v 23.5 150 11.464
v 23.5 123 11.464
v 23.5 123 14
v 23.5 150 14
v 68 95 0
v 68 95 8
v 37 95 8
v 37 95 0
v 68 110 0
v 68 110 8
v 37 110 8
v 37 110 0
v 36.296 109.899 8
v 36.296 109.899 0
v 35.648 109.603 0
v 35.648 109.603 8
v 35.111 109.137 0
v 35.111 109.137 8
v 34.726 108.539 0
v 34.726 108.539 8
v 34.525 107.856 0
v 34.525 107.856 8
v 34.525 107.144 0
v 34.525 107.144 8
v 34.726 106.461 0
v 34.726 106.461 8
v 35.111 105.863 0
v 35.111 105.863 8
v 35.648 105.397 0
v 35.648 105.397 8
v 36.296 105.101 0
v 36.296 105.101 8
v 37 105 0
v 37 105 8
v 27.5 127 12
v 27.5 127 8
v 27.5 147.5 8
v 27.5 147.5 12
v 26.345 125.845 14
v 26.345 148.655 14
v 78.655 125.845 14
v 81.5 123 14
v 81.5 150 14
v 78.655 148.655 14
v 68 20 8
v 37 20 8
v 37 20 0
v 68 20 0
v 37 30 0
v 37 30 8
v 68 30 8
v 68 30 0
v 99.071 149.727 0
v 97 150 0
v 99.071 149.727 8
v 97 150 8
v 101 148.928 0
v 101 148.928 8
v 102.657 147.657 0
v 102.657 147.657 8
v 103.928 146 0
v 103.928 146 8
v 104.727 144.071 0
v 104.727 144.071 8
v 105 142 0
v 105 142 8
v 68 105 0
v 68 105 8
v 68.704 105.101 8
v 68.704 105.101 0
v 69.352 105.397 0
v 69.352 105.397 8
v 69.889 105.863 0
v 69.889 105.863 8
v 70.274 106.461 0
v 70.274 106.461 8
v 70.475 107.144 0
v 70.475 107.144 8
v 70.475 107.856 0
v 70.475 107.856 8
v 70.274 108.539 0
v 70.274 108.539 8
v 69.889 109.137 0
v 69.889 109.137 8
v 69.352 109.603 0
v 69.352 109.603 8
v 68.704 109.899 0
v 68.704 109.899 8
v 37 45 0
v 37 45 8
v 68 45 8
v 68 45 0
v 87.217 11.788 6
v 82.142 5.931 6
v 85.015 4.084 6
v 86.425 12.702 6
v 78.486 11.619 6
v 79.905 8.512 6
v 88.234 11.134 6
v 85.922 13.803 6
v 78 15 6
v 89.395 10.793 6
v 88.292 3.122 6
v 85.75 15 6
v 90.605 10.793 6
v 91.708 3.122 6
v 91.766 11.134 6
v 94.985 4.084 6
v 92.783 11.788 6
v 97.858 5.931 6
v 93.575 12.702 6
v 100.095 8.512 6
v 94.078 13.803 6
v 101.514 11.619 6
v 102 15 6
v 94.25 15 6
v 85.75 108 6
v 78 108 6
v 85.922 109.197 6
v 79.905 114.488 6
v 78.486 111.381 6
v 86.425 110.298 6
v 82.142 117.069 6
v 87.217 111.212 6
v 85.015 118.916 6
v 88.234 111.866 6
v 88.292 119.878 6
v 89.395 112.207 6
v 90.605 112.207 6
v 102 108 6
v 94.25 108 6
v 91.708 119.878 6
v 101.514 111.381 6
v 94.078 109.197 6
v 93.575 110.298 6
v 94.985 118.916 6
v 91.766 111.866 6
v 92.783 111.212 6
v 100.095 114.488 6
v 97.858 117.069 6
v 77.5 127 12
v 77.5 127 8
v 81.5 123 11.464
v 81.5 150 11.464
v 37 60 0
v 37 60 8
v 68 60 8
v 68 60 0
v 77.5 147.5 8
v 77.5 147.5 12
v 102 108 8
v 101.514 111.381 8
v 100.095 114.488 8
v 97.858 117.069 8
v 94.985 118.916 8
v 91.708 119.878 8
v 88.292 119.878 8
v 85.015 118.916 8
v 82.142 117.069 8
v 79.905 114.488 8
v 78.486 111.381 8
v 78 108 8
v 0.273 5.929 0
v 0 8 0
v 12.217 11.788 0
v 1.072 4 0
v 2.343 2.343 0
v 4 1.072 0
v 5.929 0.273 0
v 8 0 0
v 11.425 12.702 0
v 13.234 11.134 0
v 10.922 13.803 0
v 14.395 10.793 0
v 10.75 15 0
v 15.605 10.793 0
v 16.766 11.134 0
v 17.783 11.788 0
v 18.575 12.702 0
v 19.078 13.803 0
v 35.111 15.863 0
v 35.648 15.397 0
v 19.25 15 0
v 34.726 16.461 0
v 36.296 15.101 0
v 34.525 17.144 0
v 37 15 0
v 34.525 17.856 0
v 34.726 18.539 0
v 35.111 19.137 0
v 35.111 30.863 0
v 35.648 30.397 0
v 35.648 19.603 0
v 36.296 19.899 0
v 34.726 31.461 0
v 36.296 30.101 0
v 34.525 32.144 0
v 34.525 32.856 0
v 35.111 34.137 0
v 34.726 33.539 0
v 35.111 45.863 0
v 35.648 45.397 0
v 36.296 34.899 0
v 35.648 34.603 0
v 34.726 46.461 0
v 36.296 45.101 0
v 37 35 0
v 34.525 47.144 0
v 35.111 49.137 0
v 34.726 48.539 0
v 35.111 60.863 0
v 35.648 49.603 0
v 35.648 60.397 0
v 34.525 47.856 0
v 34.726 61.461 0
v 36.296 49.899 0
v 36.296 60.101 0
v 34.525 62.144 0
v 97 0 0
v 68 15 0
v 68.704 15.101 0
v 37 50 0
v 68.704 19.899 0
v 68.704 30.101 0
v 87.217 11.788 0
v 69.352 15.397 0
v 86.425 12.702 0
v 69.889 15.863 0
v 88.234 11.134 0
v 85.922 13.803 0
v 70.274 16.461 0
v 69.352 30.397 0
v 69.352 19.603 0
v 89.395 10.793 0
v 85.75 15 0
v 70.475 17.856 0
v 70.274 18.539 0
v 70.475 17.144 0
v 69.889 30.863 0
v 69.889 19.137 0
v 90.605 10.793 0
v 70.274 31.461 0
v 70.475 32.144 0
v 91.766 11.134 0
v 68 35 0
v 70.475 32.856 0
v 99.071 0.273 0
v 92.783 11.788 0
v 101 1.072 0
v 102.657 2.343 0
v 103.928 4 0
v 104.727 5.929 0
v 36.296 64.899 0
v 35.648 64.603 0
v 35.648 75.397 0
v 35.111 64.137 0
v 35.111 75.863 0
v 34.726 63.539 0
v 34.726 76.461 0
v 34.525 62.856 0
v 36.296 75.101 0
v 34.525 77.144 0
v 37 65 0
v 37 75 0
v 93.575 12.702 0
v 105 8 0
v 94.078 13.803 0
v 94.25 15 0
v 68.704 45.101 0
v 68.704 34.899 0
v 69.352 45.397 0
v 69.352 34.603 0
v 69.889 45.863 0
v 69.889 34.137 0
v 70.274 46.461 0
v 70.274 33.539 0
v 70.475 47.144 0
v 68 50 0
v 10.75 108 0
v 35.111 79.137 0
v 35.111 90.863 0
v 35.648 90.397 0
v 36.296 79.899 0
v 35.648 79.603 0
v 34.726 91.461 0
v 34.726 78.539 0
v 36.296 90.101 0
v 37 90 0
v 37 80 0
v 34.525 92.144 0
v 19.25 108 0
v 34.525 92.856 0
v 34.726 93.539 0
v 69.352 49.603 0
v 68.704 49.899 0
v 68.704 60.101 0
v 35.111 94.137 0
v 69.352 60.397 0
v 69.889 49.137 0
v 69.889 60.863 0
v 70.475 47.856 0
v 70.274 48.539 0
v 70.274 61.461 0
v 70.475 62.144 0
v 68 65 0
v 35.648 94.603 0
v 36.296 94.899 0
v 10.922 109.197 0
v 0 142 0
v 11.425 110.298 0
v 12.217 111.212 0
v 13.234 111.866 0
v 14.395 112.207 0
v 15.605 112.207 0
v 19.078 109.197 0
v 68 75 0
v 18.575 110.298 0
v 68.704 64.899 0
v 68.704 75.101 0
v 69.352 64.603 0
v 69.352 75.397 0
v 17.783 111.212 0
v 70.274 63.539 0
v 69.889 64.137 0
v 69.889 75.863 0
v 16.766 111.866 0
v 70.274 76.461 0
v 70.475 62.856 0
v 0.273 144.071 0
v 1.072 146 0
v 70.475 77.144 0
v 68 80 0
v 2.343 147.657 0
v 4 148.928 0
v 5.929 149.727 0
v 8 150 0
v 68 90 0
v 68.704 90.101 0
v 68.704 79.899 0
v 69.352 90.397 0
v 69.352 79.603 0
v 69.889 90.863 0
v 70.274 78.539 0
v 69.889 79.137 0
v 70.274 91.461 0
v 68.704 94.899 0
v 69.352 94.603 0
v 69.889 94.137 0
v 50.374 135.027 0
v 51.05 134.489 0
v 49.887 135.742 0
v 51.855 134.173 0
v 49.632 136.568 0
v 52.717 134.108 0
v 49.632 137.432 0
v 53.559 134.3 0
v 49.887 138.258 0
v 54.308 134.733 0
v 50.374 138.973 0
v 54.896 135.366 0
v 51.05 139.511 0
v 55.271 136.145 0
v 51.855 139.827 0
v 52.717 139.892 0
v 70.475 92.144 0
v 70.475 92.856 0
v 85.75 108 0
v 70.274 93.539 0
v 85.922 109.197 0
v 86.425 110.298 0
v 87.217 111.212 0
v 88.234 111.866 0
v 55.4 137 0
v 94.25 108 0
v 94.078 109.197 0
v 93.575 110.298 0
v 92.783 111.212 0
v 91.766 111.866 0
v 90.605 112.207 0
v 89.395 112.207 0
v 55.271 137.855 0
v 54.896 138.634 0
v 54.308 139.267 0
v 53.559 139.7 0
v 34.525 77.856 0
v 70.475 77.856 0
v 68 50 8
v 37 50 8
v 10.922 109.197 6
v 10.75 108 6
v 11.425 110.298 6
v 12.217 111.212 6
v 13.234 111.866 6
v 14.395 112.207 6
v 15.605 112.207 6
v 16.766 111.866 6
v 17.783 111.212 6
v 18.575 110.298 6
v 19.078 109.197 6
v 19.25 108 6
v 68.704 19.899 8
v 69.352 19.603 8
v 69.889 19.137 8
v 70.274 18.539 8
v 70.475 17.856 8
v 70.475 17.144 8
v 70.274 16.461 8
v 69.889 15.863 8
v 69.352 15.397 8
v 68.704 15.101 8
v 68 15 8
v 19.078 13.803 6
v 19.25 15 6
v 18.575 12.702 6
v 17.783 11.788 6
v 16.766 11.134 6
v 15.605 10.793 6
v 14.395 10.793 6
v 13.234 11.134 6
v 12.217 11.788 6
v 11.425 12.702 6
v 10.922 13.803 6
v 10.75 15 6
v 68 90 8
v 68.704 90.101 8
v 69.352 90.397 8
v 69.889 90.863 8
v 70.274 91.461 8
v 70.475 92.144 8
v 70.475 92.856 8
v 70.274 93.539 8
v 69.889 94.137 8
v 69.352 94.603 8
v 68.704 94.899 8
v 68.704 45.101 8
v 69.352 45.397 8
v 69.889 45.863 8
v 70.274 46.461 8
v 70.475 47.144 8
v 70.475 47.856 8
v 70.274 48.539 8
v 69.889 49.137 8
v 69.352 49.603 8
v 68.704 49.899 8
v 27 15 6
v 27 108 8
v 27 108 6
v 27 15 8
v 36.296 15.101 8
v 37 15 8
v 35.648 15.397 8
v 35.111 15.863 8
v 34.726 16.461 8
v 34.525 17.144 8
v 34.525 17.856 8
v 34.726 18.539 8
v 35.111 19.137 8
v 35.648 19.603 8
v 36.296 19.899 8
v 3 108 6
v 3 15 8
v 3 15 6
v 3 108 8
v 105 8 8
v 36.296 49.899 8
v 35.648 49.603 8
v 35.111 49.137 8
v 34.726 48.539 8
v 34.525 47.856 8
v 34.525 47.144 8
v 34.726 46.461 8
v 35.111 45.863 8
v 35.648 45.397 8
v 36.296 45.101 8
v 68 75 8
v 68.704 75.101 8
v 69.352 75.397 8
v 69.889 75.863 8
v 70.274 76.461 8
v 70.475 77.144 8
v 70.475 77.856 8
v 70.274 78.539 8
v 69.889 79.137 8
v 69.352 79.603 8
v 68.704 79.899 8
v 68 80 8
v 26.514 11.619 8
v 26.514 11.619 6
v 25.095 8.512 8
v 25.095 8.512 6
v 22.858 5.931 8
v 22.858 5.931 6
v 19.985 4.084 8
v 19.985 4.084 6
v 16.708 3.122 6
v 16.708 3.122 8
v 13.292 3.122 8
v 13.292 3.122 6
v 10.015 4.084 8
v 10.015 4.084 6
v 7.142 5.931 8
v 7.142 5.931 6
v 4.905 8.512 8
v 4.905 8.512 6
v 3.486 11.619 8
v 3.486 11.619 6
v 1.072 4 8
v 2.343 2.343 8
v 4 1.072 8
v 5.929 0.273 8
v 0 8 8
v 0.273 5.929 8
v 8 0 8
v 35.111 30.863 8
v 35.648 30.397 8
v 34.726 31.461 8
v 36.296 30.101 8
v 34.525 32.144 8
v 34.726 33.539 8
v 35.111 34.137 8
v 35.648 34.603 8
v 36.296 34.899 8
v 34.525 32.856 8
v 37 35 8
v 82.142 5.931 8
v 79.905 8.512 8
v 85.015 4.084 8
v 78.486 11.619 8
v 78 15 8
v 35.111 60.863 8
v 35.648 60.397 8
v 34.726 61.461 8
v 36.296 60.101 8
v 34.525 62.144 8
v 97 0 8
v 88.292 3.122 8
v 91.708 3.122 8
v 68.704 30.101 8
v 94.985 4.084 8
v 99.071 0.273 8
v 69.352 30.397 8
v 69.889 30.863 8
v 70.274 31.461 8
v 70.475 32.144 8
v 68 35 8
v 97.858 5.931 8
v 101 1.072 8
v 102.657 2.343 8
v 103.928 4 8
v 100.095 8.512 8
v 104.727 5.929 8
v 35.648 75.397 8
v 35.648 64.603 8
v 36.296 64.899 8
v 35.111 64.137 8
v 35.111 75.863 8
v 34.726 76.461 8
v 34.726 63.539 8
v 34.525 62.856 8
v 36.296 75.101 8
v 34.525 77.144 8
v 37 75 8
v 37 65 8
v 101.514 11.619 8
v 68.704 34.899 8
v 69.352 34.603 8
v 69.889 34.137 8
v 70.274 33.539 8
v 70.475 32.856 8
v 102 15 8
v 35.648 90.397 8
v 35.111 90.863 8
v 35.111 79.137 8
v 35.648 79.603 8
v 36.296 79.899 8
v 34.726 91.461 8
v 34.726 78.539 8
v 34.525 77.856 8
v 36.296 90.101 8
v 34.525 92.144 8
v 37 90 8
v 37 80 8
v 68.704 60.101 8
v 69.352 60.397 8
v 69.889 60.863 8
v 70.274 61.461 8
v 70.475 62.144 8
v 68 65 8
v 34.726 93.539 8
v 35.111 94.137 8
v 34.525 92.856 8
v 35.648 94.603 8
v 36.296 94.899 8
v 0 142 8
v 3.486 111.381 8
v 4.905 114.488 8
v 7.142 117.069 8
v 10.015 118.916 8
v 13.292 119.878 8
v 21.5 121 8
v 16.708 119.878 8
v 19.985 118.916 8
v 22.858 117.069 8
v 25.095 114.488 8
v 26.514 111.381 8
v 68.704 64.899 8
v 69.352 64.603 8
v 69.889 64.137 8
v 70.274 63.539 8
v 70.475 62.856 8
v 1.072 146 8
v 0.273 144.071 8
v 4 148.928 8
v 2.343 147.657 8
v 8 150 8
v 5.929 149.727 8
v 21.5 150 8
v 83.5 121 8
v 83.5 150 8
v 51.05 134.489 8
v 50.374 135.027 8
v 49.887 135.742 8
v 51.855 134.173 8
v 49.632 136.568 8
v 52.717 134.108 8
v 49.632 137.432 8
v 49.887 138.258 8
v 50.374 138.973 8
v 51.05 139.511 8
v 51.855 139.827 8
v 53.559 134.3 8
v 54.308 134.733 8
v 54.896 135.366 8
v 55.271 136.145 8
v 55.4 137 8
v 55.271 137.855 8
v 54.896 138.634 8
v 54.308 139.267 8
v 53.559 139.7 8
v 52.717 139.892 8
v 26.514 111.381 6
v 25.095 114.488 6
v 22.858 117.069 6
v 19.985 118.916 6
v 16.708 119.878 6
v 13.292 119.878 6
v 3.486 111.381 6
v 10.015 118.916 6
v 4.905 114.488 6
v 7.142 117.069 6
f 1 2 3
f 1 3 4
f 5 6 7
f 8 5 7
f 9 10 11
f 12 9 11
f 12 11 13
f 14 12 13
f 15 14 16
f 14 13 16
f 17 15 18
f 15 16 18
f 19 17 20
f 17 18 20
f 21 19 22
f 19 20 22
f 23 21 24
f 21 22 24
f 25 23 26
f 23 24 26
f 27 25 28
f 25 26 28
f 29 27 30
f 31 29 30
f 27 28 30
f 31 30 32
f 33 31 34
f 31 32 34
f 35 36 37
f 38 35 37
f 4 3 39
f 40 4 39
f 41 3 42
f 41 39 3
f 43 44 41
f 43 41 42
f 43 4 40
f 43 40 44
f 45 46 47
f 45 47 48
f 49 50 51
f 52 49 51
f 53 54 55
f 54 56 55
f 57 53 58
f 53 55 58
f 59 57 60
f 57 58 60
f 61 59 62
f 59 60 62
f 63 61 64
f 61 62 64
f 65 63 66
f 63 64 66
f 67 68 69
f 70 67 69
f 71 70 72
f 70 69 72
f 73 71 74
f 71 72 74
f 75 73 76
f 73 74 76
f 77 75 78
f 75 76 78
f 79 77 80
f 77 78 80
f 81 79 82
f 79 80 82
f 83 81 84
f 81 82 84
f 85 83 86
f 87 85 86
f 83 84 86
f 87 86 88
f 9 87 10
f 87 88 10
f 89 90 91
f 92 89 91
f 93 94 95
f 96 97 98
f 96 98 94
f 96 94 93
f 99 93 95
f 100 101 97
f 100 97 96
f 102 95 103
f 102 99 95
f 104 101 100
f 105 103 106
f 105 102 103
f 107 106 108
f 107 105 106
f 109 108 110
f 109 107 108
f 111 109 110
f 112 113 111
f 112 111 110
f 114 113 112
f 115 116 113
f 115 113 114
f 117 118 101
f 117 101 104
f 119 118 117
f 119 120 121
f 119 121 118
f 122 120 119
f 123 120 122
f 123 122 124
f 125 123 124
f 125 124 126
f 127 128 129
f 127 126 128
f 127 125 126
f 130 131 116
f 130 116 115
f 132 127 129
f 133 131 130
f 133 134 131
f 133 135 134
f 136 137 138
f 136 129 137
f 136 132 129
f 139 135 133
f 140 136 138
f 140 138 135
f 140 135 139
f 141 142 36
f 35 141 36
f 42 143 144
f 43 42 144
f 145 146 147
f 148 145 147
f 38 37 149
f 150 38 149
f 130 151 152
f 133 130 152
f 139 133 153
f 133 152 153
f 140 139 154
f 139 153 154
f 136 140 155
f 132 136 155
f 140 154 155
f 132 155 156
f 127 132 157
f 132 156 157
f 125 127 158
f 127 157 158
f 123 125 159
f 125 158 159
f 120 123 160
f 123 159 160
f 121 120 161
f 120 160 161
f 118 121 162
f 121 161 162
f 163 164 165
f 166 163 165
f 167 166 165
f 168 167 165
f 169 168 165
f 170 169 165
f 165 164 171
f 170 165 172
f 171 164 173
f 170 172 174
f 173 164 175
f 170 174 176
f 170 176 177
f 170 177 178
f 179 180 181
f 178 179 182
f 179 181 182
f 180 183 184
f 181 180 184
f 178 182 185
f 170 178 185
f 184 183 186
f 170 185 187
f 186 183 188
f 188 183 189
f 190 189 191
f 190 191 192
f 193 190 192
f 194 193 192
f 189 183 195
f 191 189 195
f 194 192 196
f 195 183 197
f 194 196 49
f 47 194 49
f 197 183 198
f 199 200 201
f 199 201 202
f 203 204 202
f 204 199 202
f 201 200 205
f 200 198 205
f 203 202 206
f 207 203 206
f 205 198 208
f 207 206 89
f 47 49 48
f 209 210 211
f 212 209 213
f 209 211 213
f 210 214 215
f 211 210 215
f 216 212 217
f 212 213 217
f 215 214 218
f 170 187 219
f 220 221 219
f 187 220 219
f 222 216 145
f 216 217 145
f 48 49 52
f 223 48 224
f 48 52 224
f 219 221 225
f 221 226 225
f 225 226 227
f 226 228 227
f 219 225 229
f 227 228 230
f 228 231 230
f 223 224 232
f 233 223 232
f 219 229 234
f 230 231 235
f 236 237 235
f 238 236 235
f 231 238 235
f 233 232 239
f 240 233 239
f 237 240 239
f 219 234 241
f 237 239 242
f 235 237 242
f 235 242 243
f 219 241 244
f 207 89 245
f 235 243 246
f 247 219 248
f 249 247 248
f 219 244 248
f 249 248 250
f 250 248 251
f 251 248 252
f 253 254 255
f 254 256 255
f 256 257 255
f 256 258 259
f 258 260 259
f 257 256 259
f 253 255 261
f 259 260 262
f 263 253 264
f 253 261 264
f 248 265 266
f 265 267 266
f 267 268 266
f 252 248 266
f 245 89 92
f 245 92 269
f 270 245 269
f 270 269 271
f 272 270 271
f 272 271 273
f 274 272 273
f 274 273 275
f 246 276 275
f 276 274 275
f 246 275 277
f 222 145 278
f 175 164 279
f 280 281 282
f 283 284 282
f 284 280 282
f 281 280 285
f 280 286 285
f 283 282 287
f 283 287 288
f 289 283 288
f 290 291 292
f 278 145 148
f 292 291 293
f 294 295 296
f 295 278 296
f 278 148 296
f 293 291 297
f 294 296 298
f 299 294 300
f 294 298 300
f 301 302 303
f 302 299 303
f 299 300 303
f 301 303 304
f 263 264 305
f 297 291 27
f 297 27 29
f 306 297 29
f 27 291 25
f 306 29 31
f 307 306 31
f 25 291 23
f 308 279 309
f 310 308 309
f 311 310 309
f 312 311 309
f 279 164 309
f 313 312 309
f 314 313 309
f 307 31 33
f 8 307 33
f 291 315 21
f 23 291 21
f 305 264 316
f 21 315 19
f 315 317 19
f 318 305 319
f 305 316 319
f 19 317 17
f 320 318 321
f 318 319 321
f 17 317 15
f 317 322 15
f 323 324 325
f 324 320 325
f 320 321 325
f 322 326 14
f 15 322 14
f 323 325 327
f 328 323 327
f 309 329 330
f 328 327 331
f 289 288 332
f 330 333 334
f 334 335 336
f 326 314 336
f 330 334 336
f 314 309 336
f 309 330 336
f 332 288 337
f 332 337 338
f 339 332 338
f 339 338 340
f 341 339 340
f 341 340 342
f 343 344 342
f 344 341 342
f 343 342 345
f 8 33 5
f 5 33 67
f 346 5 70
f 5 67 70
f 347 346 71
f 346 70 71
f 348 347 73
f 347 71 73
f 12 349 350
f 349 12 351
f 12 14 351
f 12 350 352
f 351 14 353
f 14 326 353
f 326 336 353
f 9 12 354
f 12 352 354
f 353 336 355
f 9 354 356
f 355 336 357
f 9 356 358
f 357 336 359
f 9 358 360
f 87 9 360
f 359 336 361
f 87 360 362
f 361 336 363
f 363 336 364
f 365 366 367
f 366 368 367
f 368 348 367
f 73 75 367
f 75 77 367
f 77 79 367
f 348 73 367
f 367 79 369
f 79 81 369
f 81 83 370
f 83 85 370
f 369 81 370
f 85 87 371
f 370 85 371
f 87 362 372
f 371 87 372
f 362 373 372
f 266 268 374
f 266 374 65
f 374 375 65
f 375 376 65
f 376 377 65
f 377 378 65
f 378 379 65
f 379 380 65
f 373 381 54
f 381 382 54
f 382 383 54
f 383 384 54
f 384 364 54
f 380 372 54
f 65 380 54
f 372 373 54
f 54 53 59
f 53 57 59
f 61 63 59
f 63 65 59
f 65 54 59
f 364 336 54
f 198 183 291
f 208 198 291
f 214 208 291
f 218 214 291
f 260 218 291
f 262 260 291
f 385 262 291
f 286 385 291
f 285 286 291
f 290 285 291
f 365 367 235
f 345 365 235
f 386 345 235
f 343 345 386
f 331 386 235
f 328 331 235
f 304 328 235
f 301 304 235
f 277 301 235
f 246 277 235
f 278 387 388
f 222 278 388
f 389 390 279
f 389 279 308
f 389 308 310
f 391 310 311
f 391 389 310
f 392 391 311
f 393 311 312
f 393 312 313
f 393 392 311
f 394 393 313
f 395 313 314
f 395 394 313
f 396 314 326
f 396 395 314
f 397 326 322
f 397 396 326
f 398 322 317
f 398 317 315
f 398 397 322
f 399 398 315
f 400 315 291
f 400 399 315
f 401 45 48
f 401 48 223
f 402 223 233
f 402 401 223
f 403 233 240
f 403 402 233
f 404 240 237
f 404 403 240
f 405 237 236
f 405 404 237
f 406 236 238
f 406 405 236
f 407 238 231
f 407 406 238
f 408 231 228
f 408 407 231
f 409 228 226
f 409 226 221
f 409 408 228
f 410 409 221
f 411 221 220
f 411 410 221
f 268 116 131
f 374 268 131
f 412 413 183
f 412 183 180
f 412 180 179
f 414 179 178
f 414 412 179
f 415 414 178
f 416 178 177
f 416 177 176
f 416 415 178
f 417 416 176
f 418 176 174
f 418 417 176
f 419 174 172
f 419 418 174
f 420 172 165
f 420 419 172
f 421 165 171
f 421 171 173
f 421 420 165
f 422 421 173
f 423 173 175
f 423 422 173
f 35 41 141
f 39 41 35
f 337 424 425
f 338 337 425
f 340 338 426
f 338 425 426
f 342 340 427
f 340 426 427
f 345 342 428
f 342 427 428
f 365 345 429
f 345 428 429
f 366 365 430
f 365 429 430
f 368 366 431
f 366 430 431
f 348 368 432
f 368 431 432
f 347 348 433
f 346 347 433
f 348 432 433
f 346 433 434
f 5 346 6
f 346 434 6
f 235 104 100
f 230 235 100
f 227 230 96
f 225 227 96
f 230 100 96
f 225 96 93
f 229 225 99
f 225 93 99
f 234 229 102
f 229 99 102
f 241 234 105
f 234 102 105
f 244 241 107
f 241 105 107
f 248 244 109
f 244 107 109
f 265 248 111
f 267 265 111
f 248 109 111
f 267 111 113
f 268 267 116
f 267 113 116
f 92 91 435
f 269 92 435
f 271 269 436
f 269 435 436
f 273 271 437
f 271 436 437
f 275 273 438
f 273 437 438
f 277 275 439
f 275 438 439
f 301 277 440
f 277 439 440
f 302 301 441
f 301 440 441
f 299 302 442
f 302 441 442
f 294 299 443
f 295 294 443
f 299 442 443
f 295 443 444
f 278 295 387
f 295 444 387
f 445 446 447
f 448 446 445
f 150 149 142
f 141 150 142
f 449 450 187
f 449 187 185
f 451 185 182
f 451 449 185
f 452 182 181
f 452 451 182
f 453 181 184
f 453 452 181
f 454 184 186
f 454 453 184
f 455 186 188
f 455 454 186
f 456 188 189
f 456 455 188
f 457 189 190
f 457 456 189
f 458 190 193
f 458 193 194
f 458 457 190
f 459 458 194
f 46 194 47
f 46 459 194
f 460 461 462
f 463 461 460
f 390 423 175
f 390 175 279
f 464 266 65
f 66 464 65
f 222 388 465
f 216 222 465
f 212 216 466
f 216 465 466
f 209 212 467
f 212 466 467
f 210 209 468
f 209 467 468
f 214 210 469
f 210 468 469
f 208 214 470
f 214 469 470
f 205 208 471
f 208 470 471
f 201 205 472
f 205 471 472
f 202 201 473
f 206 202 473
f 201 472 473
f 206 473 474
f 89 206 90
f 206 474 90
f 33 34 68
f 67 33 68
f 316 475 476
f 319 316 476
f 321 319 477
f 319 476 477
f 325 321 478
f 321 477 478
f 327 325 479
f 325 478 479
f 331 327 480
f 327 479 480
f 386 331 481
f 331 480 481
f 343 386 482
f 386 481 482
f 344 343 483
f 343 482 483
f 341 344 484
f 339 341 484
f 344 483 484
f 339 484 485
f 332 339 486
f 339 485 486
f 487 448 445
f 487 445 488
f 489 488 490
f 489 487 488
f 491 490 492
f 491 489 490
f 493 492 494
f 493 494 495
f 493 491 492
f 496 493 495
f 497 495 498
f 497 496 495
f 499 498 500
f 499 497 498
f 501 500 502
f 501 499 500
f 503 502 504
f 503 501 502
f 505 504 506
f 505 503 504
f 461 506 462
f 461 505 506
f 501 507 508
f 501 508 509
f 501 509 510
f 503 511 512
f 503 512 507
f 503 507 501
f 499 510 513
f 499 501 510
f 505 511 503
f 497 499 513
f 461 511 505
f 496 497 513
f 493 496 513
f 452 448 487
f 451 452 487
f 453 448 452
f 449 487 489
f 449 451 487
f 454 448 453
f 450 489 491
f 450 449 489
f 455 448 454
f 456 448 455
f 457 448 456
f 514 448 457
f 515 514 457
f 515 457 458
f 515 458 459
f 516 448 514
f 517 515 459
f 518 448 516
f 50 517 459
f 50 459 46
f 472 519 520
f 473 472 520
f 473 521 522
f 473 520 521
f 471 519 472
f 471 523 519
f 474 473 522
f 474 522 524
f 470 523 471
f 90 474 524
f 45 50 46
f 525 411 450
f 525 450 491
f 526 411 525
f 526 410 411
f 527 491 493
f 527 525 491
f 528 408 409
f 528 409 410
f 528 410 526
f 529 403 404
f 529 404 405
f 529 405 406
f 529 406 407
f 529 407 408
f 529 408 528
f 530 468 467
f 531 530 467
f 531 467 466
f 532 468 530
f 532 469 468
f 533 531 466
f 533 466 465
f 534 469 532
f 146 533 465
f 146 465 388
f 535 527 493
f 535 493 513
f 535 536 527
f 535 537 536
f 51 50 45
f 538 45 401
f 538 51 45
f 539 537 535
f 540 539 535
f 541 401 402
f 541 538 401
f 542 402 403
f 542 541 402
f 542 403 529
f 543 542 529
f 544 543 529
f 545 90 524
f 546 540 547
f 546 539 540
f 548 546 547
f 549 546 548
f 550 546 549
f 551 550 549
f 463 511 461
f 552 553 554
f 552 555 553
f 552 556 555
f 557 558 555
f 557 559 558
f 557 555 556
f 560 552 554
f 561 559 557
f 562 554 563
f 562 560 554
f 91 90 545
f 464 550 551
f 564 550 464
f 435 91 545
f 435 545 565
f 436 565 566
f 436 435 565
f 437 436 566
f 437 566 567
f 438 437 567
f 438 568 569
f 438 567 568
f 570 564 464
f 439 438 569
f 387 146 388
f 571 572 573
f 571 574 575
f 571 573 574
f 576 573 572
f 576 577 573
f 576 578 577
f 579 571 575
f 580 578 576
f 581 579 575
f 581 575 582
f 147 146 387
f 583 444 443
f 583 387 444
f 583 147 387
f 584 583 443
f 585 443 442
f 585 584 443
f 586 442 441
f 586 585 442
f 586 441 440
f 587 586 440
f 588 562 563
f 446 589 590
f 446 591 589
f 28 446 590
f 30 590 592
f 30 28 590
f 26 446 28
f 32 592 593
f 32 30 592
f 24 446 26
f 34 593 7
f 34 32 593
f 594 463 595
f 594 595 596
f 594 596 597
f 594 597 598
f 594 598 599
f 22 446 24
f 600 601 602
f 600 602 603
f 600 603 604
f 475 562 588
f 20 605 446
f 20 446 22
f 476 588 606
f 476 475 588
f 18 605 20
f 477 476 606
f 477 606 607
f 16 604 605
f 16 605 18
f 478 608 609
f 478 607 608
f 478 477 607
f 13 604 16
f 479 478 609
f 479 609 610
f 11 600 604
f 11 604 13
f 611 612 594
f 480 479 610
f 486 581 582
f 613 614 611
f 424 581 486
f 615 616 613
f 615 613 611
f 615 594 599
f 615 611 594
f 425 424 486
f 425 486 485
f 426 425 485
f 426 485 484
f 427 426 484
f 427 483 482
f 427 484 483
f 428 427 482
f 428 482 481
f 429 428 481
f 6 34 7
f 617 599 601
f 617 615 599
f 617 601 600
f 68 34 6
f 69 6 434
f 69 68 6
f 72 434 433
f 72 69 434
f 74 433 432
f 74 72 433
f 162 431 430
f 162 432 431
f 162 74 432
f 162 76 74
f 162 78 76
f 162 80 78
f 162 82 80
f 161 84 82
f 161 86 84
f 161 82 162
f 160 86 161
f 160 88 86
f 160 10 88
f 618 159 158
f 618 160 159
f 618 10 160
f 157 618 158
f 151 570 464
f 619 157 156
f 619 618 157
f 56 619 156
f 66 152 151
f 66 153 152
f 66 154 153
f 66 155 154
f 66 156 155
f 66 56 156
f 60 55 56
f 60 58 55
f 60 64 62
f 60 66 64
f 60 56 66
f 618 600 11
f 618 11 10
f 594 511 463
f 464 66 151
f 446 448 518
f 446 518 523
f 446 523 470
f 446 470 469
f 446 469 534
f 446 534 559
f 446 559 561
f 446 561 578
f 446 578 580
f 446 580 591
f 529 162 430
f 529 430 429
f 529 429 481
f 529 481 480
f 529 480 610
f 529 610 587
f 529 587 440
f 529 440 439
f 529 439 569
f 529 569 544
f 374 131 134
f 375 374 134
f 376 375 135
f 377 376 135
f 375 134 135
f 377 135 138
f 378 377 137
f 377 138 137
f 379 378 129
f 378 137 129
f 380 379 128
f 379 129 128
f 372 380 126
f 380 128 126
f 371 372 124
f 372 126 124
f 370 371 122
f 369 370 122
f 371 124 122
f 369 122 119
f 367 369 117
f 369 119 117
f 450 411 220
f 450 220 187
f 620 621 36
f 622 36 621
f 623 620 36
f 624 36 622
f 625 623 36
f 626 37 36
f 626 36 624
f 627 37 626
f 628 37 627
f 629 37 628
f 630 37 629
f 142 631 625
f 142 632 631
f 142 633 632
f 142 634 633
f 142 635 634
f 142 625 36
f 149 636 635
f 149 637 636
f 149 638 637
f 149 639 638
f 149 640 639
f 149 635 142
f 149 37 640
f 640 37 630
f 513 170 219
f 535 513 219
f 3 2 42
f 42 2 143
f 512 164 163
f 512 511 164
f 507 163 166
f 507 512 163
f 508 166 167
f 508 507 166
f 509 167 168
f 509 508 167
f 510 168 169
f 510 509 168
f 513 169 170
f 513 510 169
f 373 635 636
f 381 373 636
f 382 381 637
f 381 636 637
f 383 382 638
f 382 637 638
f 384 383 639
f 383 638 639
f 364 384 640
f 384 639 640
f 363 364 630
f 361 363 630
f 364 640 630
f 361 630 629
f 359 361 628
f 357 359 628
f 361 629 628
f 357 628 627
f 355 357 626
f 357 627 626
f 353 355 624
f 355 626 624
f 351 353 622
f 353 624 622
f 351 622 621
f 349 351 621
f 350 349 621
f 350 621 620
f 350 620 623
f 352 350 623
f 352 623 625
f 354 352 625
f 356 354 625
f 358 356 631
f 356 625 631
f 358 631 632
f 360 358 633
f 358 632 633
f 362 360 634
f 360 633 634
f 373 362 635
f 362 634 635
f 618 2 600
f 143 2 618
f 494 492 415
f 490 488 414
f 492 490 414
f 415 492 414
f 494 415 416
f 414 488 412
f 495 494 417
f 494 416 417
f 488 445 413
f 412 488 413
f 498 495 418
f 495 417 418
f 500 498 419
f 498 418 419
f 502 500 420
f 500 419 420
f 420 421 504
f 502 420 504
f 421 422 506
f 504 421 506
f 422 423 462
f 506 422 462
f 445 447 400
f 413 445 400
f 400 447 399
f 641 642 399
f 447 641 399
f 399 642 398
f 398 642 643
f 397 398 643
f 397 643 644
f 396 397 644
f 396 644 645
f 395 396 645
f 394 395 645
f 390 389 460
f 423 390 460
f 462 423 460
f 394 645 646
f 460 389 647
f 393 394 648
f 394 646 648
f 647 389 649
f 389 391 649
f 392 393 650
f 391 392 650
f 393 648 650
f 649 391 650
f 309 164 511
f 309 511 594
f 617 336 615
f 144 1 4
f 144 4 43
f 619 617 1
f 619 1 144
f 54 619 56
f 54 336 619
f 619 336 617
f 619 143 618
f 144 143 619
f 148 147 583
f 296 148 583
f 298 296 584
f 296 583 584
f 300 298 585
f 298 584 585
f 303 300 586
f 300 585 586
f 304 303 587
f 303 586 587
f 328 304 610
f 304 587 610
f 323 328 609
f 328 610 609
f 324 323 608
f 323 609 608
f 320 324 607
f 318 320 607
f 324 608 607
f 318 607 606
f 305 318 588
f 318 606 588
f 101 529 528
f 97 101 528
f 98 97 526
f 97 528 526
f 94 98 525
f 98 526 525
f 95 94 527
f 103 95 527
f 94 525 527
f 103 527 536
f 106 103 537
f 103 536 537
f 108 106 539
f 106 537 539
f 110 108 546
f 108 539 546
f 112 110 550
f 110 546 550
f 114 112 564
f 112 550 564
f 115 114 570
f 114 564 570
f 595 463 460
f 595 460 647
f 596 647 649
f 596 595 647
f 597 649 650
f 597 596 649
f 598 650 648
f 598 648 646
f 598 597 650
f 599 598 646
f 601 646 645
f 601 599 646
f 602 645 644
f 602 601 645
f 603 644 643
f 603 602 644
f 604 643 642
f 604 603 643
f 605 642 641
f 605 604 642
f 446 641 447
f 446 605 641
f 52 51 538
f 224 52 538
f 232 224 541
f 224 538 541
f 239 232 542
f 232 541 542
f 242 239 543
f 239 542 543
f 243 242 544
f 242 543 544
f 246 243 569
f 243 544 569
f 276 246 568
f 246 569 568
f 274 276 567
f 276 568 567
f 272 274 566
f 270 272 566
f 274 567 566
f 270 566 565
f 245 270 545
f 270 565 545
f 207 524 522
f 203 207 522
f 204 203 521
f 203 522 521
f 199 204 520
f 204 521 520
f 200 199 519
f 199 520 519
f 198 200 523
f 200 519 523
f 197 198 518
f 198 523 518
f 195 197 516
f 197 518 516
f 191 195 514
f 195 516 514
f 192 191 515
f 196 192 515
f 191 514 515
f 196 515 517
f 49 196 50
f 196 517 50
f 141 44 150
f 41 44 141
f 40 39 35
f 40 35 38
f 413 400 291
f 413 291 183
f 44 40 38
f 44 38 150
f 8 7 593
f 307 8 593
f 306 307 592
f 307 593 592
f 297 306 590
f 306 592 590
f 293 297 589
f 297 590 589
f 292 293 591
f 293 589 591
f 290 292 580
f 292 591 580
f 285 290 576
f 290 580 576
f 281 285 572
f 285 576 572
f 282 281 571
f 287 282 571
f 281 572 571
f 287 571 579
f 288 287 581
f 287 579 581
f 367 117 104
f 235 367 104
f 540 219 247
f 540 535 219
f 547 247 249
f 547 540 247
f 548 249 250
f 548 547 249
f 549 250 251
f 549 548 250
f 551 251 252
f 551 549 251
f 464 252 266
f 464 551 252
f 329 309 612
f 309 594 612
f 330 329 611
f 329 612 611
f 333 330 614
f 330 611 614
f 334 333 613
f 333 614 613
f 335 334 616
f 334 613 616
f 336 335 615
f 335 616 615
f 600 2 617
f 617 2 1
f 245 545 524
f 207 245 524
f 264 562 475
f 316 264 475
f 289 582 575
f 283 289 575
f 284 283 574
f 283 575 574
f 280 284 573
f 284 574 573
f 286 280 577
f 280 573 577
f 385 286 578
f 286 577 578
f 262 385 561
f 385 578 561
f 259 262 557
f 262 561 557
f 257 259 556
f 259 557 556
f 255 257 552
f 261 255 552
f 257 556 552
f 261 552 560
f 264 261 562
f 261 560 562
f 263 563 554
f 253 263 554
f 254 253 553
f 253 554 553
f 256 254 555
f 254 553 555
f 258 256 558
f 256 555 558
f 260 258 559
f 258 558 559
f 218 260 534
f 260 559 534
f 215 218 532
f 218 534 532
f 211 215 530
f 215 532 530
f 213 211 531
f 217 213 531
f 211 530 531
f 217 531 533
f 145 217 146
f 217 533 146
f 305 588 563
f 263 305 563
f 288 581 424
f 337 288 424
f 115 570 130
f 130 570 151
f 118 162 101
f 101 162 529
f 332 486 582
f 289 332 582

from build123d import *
from OCP.BRepFilletAPI import BRepFilletAPI_MakeChamfer

# Parameters (mm, degrees)
CROQUIS1_W              = 105
CROQUIS1_H              = 150
SALIENTE_EXTRUIR1_DEPTH = 8
CROQUIS2_R              = 2.9
CORTAR_EXTRUIR4_DEPTH   = 8
CROQUIS3_W              = 58
CROQUIS3_H              = 27
SALIENTE_EXTRUIR2_DEPTH = 6
REDONDEO1_R             = 8
REDONDEO2_R             = 8
REDONDEO3_R             = 8
REDONDEO4_R             = 8
CORTAR_EXTRUIR5_DEPTH   = 2
CHAFL_N1_SIZE           = 2
CHAFL_N1_SIZE2          = 1.154700538
CHAFL_N2_SIZE           = 2
CHAFL_N2_SIZE2          = 3.464101615
CORTAR_EXTRUIR6_DEPTH   = 8


with BuildPart() as part:
    # Croquis1 → Saliente-Extruir1 (new body)
    with BuildSketch(Plane.XY):
        with Locations((52.5, 75)):
            Rectangle(CROQUIS1_W, CROQUIS1_H)
    extrude(amount=SALIENTE_EXTRUIR1_DEPTH)

    # Croquis2 → Cortar-Extruir4 (cut)
    with BuildSketch(Plane.XY.offset(8)):
        with Locations((52.5, 137)):
            Circle(CROQUIS2_R)
        with BuildLine():
            Line((19.25, 108), (19.25, 15))
            ThreePointArc((19.25, 15), (15, 10.75), (10.75, 15))
            Line((10.75, 15), (10.75, 108))
            ThreePointArc((10.75, 108), (15, 112.25), (19.25, 108))
        make_face()
        with BuildLine():
            Line((85.75, 108), (85.75, 15))
            ThreePointArc((85.75, 15), (90, 10.75), (94.25, 15))
            Line((94.25, 15), (94.25, 108))
            ThreePointArc((94.25, 108), (90, 112.25), (85.75, 108))
        make_face()
    extrude(amount=-CORTAR_EXTRUIR4_DEPTH, mode=Mode.SUBTRACT)

    # Croquis3 → Saliente-Extruir2 (add)
    with BuildSketch(Plane.XY.offset(8)):
        with Locations((52.5, 136.5)):
            Rectangle(CROQUIS3_W, CROQUIS3_H)
        Polygon((77.5, 127), (52.5, 127), (27.5, 127), (27.5, 147.5), (77.5, 147.5), align=None, mode=Mode.SUBTRACT)
    extrude(amount=SALIENTE_EXTRUIR2_DEPTH)

    # Redondeo1
    redondeo1_edges = [part.edges().sort_by_distance(p)[0] for p in [
        (0, 150, 4),
    ]]
    fillet(redondeo1_edges, radius=REDONDEO1_R)

    # Redondeo2
    redondeo2_edges = [part.edges().sort_by_distance(p)[0] for p in [
        (105, 150, 4),
    ]]
    fillet(redondeo2_edges, radius=REDONDEO2_R)

    # Redondeo3
    redondeo3_edges = [part.edges().sort_by_distance(p)[0] for p in [
        (0, 0, 4),
    ]]
    fillet(redondeo3_edges, radius=REDONDEO3_R)

    # Redondeo4
    redondeo4_edges = [part.edges().sort_by_distance(p)[0] for p in [
        (105, 0, 4),
    ]]
    fillet(redondeo4_edges, radius=REDONDEO4_R)

    # Croquis4 → Cortar-Extruir5 (cut)
    # profile 1 of 2: a face of its own
    with BuildSketch(Plane.XY.offset(8)):
        with BuildLine():
            Line((27, 108), (27, 15))
            ThreePointArc((27, 15), (15, 3), (3, 15))
            Line((3, 15), (3, 108))
            ThreePointArc((3, 108), (15, 120), (27, 108))
        make_face()
        with BuildLine():
            Line((10.75, 108), (10.75, 15))
            ThreePointArc((10.75, 15), (15, 10.75), (19.25, 15))
            Line((19.25, 15), (19.25, 108))
            ThreePointArc((19.25, 108), (15, 112.25), (10.75, 108))
        make_face(mode=Mode.SUBTRACT)
    # profile 2 of 2: a face of its own
    with BuildSketch(Plane.XY.offset(8)):
        with BuildLine():
            Line((78, 108), (78, 15))
            ThreePointArc((78, 15), (90, 3), (102, 15))
            Line((102, 15), (102, 108))
            ThreePointArc((102, 108), (90, 120), (78, 108))
        make_face()
        with BuildLine():
            Line((85.75, 108), (85.75, 15))
            ThreePointArc((85.75, 15), (90, 10.75), (94.25, 15))
            Line((94.25, 15), (94.25, 108))
            ThreePointArc((94.25, 108), (90, 112.25), (85.75, 108))
        make_face(mode=Mode.SUBTRACT)
    extrude(amount=-CORTAR_EXTRUIR5_DEPTH, mode=Mode.SUBTRACT)

    # Chaflán1: one chamfer whose edges measure the first distance from different faces: ONE call of the kernel's chamfer builder (chamfer() names one face for all edges)
    chafl_n1_edges_1 = [part.edges().sort_by_distance(p)[0] for p in [
        (52.5, 127, 14),
    ]]
    chafl_n1_side_1 = [part.faces().sort_by_distance(p)[0] for p in [
        (52.5, 127, 11),
    ]]
    chafl_n1_edges_2 = [part.edges().sort_by_distance(p)[0] for p in [
        (27.5, 137.25, 14),
    ]]
    chafl_n1_side_2 = [part.faces().sort_by_distance(p)[0] for p in [
        (27.5, 137.25, 11),
    ]]
    chafl_n1_edges_3 = [part.edges().sort_by_distance(p)[0] for p in [
        (52.5, 147.5, 14),
    ]]
    chafl_n1_side_3 = [part.faces().sort_by_distance(p)[0] for p in [
        (52.5, 147.5, 11),
    ]]
    chafl_n1_edges_4 = [part.edges().sort_by_distance(p)[0] for p in [
        (77.5, 137.25, 14),
    ]]
    chafl_n1_side_4 = [part.faces().sort_by_distance(p)[0] for p in [
        (77.5, 137.25, 11),
    ]]
    chafl_n1 = BRepFilletAPI_MakeChamfer(part.part.solid().wrapped)
    for e in chafl_n1_edges_1:
        chafl_n1.Add(CHAFL_N1_SIZE, CHAFL_N1_SIZE2, e.wrapped, chafl_n1_side_1[0].wrapped)  # the first distance lies on this face
    for e in chafl_n1_edges_2:
        chafl_n1.Add(CHAFL_N1_SIZE, CHAFL_N1_SIZE2, e.wrapped, chafl_n1_side_2[0].wrapped)  # the first distance lies on this face
    for e in chafl_n1_edges_3:
        chafl_n1.Add(CHAFL_N1_SIZE, CHAFL_N1_SIZE2, e.wrapped, chafl_n1_side_3[0].wrapped)  # the first distance lies on this face
    for e in chafl_n1_edges_4:
        chafl_n1.Add(CHAFL_N1_SIZE, CHAFL_N1_SIZE2, e.wrapped, chafl_n1_side_4[0].wrapped)  # the first distance lies on this face
    add(Compound.cast(chafl_n1.Shape()), mode=Mode.REPLACE)

    # Chaflán2
    chafl_n2_edges = [part.edges().sort_by_distance(p)[0] for p in [
        (52.5, 123, 8),
        (81.5, 136.5, 8),
        (23.5, 136.5, 8),
    ]]
    chafl_n2_side = [part.faces().sort_by_distance(p)[0] for p in [
        (52.5, 72.279712642, 8),
    ]]
    chamfer(chafl_n2_edges, length=CHAFL_N2_SIZE, length2=CHAFL_N2_SIZE2, reference=chafl_n2_side[0])

    # Croquis6 → Cortar-Extruir6 (cut)
    with BuildSketch(Plane.XY.offset(8)):
        with BuildLine():
            Line((37, 20), (68, 20))
            ThreePointArc((68, 20), (70.5, 17.5), (68, 15))
            Line((68, 15), (37, 15))
            ThreePointArc((37, 15), (34.5, 17.5), (37, 20))
        make_face()
        with BuildLine():
            Line((37, 30), (68, 30))
            ThreePointArc((68, 30), (70.5, 32.5), (68, 35))
            Line((68, 35), (37, 35))
            ThreePointArc((37, 35), (34.5, 32.5), (37, 30))
        make_face()
        with BuildLine():
            Line((37, 45), (68, 45))
            ThreePointArc((68, 45), (70.5, 47.5), (68, 50))
            Line((68, 50), (37, 50))
            ThreePointArc((37, 50), (34.5, 47.5), (37, 45))
        make_face()
        with BuildLine():
            Line((37, 60), (68, 60))
            ThreePointArc((68, 60), (70.5, 62.5), (68, 65))
            Line((68, 65), (37, 65))
            ThreePointArc((37, 65), (34.5, 62.5), (37, 60))
        make_face()
        with BuildLine():
            Line((37, 75), (68, 75))
            ThreePointArc((68, 75), (70.5, 77.5), (68, 80))
            Line((68, 80), (37, 80))
            ThreePointArc((37, 80), (34.5, 77.5), (37, 75))
        make_face()
        with BuildLine():
            Line((37, 90), (68, 90))
            ThreePointArc((68, 90), (70.5, 92.5), (68, 95))
            Line((68, 95), (37, 95))
            ThreePointArc((37, 95), (34.5, 92.5), (37, 90))
        make_face()
        with BuildLine():
            Line((37, 105), (68, 105))
            ThreePointArc((68, 105), (70.5, 107.5), (68, 110))
            Line((68, 110), (37, 110))
            ThreePointArc((37, 110), (34.5, 107.5), (37, 105))
        make_face()
    extrude(amount=-CORTAR_EXTRUIR6_DEPTH, mode=Mode.SUBTRACT)


solid = part.part
